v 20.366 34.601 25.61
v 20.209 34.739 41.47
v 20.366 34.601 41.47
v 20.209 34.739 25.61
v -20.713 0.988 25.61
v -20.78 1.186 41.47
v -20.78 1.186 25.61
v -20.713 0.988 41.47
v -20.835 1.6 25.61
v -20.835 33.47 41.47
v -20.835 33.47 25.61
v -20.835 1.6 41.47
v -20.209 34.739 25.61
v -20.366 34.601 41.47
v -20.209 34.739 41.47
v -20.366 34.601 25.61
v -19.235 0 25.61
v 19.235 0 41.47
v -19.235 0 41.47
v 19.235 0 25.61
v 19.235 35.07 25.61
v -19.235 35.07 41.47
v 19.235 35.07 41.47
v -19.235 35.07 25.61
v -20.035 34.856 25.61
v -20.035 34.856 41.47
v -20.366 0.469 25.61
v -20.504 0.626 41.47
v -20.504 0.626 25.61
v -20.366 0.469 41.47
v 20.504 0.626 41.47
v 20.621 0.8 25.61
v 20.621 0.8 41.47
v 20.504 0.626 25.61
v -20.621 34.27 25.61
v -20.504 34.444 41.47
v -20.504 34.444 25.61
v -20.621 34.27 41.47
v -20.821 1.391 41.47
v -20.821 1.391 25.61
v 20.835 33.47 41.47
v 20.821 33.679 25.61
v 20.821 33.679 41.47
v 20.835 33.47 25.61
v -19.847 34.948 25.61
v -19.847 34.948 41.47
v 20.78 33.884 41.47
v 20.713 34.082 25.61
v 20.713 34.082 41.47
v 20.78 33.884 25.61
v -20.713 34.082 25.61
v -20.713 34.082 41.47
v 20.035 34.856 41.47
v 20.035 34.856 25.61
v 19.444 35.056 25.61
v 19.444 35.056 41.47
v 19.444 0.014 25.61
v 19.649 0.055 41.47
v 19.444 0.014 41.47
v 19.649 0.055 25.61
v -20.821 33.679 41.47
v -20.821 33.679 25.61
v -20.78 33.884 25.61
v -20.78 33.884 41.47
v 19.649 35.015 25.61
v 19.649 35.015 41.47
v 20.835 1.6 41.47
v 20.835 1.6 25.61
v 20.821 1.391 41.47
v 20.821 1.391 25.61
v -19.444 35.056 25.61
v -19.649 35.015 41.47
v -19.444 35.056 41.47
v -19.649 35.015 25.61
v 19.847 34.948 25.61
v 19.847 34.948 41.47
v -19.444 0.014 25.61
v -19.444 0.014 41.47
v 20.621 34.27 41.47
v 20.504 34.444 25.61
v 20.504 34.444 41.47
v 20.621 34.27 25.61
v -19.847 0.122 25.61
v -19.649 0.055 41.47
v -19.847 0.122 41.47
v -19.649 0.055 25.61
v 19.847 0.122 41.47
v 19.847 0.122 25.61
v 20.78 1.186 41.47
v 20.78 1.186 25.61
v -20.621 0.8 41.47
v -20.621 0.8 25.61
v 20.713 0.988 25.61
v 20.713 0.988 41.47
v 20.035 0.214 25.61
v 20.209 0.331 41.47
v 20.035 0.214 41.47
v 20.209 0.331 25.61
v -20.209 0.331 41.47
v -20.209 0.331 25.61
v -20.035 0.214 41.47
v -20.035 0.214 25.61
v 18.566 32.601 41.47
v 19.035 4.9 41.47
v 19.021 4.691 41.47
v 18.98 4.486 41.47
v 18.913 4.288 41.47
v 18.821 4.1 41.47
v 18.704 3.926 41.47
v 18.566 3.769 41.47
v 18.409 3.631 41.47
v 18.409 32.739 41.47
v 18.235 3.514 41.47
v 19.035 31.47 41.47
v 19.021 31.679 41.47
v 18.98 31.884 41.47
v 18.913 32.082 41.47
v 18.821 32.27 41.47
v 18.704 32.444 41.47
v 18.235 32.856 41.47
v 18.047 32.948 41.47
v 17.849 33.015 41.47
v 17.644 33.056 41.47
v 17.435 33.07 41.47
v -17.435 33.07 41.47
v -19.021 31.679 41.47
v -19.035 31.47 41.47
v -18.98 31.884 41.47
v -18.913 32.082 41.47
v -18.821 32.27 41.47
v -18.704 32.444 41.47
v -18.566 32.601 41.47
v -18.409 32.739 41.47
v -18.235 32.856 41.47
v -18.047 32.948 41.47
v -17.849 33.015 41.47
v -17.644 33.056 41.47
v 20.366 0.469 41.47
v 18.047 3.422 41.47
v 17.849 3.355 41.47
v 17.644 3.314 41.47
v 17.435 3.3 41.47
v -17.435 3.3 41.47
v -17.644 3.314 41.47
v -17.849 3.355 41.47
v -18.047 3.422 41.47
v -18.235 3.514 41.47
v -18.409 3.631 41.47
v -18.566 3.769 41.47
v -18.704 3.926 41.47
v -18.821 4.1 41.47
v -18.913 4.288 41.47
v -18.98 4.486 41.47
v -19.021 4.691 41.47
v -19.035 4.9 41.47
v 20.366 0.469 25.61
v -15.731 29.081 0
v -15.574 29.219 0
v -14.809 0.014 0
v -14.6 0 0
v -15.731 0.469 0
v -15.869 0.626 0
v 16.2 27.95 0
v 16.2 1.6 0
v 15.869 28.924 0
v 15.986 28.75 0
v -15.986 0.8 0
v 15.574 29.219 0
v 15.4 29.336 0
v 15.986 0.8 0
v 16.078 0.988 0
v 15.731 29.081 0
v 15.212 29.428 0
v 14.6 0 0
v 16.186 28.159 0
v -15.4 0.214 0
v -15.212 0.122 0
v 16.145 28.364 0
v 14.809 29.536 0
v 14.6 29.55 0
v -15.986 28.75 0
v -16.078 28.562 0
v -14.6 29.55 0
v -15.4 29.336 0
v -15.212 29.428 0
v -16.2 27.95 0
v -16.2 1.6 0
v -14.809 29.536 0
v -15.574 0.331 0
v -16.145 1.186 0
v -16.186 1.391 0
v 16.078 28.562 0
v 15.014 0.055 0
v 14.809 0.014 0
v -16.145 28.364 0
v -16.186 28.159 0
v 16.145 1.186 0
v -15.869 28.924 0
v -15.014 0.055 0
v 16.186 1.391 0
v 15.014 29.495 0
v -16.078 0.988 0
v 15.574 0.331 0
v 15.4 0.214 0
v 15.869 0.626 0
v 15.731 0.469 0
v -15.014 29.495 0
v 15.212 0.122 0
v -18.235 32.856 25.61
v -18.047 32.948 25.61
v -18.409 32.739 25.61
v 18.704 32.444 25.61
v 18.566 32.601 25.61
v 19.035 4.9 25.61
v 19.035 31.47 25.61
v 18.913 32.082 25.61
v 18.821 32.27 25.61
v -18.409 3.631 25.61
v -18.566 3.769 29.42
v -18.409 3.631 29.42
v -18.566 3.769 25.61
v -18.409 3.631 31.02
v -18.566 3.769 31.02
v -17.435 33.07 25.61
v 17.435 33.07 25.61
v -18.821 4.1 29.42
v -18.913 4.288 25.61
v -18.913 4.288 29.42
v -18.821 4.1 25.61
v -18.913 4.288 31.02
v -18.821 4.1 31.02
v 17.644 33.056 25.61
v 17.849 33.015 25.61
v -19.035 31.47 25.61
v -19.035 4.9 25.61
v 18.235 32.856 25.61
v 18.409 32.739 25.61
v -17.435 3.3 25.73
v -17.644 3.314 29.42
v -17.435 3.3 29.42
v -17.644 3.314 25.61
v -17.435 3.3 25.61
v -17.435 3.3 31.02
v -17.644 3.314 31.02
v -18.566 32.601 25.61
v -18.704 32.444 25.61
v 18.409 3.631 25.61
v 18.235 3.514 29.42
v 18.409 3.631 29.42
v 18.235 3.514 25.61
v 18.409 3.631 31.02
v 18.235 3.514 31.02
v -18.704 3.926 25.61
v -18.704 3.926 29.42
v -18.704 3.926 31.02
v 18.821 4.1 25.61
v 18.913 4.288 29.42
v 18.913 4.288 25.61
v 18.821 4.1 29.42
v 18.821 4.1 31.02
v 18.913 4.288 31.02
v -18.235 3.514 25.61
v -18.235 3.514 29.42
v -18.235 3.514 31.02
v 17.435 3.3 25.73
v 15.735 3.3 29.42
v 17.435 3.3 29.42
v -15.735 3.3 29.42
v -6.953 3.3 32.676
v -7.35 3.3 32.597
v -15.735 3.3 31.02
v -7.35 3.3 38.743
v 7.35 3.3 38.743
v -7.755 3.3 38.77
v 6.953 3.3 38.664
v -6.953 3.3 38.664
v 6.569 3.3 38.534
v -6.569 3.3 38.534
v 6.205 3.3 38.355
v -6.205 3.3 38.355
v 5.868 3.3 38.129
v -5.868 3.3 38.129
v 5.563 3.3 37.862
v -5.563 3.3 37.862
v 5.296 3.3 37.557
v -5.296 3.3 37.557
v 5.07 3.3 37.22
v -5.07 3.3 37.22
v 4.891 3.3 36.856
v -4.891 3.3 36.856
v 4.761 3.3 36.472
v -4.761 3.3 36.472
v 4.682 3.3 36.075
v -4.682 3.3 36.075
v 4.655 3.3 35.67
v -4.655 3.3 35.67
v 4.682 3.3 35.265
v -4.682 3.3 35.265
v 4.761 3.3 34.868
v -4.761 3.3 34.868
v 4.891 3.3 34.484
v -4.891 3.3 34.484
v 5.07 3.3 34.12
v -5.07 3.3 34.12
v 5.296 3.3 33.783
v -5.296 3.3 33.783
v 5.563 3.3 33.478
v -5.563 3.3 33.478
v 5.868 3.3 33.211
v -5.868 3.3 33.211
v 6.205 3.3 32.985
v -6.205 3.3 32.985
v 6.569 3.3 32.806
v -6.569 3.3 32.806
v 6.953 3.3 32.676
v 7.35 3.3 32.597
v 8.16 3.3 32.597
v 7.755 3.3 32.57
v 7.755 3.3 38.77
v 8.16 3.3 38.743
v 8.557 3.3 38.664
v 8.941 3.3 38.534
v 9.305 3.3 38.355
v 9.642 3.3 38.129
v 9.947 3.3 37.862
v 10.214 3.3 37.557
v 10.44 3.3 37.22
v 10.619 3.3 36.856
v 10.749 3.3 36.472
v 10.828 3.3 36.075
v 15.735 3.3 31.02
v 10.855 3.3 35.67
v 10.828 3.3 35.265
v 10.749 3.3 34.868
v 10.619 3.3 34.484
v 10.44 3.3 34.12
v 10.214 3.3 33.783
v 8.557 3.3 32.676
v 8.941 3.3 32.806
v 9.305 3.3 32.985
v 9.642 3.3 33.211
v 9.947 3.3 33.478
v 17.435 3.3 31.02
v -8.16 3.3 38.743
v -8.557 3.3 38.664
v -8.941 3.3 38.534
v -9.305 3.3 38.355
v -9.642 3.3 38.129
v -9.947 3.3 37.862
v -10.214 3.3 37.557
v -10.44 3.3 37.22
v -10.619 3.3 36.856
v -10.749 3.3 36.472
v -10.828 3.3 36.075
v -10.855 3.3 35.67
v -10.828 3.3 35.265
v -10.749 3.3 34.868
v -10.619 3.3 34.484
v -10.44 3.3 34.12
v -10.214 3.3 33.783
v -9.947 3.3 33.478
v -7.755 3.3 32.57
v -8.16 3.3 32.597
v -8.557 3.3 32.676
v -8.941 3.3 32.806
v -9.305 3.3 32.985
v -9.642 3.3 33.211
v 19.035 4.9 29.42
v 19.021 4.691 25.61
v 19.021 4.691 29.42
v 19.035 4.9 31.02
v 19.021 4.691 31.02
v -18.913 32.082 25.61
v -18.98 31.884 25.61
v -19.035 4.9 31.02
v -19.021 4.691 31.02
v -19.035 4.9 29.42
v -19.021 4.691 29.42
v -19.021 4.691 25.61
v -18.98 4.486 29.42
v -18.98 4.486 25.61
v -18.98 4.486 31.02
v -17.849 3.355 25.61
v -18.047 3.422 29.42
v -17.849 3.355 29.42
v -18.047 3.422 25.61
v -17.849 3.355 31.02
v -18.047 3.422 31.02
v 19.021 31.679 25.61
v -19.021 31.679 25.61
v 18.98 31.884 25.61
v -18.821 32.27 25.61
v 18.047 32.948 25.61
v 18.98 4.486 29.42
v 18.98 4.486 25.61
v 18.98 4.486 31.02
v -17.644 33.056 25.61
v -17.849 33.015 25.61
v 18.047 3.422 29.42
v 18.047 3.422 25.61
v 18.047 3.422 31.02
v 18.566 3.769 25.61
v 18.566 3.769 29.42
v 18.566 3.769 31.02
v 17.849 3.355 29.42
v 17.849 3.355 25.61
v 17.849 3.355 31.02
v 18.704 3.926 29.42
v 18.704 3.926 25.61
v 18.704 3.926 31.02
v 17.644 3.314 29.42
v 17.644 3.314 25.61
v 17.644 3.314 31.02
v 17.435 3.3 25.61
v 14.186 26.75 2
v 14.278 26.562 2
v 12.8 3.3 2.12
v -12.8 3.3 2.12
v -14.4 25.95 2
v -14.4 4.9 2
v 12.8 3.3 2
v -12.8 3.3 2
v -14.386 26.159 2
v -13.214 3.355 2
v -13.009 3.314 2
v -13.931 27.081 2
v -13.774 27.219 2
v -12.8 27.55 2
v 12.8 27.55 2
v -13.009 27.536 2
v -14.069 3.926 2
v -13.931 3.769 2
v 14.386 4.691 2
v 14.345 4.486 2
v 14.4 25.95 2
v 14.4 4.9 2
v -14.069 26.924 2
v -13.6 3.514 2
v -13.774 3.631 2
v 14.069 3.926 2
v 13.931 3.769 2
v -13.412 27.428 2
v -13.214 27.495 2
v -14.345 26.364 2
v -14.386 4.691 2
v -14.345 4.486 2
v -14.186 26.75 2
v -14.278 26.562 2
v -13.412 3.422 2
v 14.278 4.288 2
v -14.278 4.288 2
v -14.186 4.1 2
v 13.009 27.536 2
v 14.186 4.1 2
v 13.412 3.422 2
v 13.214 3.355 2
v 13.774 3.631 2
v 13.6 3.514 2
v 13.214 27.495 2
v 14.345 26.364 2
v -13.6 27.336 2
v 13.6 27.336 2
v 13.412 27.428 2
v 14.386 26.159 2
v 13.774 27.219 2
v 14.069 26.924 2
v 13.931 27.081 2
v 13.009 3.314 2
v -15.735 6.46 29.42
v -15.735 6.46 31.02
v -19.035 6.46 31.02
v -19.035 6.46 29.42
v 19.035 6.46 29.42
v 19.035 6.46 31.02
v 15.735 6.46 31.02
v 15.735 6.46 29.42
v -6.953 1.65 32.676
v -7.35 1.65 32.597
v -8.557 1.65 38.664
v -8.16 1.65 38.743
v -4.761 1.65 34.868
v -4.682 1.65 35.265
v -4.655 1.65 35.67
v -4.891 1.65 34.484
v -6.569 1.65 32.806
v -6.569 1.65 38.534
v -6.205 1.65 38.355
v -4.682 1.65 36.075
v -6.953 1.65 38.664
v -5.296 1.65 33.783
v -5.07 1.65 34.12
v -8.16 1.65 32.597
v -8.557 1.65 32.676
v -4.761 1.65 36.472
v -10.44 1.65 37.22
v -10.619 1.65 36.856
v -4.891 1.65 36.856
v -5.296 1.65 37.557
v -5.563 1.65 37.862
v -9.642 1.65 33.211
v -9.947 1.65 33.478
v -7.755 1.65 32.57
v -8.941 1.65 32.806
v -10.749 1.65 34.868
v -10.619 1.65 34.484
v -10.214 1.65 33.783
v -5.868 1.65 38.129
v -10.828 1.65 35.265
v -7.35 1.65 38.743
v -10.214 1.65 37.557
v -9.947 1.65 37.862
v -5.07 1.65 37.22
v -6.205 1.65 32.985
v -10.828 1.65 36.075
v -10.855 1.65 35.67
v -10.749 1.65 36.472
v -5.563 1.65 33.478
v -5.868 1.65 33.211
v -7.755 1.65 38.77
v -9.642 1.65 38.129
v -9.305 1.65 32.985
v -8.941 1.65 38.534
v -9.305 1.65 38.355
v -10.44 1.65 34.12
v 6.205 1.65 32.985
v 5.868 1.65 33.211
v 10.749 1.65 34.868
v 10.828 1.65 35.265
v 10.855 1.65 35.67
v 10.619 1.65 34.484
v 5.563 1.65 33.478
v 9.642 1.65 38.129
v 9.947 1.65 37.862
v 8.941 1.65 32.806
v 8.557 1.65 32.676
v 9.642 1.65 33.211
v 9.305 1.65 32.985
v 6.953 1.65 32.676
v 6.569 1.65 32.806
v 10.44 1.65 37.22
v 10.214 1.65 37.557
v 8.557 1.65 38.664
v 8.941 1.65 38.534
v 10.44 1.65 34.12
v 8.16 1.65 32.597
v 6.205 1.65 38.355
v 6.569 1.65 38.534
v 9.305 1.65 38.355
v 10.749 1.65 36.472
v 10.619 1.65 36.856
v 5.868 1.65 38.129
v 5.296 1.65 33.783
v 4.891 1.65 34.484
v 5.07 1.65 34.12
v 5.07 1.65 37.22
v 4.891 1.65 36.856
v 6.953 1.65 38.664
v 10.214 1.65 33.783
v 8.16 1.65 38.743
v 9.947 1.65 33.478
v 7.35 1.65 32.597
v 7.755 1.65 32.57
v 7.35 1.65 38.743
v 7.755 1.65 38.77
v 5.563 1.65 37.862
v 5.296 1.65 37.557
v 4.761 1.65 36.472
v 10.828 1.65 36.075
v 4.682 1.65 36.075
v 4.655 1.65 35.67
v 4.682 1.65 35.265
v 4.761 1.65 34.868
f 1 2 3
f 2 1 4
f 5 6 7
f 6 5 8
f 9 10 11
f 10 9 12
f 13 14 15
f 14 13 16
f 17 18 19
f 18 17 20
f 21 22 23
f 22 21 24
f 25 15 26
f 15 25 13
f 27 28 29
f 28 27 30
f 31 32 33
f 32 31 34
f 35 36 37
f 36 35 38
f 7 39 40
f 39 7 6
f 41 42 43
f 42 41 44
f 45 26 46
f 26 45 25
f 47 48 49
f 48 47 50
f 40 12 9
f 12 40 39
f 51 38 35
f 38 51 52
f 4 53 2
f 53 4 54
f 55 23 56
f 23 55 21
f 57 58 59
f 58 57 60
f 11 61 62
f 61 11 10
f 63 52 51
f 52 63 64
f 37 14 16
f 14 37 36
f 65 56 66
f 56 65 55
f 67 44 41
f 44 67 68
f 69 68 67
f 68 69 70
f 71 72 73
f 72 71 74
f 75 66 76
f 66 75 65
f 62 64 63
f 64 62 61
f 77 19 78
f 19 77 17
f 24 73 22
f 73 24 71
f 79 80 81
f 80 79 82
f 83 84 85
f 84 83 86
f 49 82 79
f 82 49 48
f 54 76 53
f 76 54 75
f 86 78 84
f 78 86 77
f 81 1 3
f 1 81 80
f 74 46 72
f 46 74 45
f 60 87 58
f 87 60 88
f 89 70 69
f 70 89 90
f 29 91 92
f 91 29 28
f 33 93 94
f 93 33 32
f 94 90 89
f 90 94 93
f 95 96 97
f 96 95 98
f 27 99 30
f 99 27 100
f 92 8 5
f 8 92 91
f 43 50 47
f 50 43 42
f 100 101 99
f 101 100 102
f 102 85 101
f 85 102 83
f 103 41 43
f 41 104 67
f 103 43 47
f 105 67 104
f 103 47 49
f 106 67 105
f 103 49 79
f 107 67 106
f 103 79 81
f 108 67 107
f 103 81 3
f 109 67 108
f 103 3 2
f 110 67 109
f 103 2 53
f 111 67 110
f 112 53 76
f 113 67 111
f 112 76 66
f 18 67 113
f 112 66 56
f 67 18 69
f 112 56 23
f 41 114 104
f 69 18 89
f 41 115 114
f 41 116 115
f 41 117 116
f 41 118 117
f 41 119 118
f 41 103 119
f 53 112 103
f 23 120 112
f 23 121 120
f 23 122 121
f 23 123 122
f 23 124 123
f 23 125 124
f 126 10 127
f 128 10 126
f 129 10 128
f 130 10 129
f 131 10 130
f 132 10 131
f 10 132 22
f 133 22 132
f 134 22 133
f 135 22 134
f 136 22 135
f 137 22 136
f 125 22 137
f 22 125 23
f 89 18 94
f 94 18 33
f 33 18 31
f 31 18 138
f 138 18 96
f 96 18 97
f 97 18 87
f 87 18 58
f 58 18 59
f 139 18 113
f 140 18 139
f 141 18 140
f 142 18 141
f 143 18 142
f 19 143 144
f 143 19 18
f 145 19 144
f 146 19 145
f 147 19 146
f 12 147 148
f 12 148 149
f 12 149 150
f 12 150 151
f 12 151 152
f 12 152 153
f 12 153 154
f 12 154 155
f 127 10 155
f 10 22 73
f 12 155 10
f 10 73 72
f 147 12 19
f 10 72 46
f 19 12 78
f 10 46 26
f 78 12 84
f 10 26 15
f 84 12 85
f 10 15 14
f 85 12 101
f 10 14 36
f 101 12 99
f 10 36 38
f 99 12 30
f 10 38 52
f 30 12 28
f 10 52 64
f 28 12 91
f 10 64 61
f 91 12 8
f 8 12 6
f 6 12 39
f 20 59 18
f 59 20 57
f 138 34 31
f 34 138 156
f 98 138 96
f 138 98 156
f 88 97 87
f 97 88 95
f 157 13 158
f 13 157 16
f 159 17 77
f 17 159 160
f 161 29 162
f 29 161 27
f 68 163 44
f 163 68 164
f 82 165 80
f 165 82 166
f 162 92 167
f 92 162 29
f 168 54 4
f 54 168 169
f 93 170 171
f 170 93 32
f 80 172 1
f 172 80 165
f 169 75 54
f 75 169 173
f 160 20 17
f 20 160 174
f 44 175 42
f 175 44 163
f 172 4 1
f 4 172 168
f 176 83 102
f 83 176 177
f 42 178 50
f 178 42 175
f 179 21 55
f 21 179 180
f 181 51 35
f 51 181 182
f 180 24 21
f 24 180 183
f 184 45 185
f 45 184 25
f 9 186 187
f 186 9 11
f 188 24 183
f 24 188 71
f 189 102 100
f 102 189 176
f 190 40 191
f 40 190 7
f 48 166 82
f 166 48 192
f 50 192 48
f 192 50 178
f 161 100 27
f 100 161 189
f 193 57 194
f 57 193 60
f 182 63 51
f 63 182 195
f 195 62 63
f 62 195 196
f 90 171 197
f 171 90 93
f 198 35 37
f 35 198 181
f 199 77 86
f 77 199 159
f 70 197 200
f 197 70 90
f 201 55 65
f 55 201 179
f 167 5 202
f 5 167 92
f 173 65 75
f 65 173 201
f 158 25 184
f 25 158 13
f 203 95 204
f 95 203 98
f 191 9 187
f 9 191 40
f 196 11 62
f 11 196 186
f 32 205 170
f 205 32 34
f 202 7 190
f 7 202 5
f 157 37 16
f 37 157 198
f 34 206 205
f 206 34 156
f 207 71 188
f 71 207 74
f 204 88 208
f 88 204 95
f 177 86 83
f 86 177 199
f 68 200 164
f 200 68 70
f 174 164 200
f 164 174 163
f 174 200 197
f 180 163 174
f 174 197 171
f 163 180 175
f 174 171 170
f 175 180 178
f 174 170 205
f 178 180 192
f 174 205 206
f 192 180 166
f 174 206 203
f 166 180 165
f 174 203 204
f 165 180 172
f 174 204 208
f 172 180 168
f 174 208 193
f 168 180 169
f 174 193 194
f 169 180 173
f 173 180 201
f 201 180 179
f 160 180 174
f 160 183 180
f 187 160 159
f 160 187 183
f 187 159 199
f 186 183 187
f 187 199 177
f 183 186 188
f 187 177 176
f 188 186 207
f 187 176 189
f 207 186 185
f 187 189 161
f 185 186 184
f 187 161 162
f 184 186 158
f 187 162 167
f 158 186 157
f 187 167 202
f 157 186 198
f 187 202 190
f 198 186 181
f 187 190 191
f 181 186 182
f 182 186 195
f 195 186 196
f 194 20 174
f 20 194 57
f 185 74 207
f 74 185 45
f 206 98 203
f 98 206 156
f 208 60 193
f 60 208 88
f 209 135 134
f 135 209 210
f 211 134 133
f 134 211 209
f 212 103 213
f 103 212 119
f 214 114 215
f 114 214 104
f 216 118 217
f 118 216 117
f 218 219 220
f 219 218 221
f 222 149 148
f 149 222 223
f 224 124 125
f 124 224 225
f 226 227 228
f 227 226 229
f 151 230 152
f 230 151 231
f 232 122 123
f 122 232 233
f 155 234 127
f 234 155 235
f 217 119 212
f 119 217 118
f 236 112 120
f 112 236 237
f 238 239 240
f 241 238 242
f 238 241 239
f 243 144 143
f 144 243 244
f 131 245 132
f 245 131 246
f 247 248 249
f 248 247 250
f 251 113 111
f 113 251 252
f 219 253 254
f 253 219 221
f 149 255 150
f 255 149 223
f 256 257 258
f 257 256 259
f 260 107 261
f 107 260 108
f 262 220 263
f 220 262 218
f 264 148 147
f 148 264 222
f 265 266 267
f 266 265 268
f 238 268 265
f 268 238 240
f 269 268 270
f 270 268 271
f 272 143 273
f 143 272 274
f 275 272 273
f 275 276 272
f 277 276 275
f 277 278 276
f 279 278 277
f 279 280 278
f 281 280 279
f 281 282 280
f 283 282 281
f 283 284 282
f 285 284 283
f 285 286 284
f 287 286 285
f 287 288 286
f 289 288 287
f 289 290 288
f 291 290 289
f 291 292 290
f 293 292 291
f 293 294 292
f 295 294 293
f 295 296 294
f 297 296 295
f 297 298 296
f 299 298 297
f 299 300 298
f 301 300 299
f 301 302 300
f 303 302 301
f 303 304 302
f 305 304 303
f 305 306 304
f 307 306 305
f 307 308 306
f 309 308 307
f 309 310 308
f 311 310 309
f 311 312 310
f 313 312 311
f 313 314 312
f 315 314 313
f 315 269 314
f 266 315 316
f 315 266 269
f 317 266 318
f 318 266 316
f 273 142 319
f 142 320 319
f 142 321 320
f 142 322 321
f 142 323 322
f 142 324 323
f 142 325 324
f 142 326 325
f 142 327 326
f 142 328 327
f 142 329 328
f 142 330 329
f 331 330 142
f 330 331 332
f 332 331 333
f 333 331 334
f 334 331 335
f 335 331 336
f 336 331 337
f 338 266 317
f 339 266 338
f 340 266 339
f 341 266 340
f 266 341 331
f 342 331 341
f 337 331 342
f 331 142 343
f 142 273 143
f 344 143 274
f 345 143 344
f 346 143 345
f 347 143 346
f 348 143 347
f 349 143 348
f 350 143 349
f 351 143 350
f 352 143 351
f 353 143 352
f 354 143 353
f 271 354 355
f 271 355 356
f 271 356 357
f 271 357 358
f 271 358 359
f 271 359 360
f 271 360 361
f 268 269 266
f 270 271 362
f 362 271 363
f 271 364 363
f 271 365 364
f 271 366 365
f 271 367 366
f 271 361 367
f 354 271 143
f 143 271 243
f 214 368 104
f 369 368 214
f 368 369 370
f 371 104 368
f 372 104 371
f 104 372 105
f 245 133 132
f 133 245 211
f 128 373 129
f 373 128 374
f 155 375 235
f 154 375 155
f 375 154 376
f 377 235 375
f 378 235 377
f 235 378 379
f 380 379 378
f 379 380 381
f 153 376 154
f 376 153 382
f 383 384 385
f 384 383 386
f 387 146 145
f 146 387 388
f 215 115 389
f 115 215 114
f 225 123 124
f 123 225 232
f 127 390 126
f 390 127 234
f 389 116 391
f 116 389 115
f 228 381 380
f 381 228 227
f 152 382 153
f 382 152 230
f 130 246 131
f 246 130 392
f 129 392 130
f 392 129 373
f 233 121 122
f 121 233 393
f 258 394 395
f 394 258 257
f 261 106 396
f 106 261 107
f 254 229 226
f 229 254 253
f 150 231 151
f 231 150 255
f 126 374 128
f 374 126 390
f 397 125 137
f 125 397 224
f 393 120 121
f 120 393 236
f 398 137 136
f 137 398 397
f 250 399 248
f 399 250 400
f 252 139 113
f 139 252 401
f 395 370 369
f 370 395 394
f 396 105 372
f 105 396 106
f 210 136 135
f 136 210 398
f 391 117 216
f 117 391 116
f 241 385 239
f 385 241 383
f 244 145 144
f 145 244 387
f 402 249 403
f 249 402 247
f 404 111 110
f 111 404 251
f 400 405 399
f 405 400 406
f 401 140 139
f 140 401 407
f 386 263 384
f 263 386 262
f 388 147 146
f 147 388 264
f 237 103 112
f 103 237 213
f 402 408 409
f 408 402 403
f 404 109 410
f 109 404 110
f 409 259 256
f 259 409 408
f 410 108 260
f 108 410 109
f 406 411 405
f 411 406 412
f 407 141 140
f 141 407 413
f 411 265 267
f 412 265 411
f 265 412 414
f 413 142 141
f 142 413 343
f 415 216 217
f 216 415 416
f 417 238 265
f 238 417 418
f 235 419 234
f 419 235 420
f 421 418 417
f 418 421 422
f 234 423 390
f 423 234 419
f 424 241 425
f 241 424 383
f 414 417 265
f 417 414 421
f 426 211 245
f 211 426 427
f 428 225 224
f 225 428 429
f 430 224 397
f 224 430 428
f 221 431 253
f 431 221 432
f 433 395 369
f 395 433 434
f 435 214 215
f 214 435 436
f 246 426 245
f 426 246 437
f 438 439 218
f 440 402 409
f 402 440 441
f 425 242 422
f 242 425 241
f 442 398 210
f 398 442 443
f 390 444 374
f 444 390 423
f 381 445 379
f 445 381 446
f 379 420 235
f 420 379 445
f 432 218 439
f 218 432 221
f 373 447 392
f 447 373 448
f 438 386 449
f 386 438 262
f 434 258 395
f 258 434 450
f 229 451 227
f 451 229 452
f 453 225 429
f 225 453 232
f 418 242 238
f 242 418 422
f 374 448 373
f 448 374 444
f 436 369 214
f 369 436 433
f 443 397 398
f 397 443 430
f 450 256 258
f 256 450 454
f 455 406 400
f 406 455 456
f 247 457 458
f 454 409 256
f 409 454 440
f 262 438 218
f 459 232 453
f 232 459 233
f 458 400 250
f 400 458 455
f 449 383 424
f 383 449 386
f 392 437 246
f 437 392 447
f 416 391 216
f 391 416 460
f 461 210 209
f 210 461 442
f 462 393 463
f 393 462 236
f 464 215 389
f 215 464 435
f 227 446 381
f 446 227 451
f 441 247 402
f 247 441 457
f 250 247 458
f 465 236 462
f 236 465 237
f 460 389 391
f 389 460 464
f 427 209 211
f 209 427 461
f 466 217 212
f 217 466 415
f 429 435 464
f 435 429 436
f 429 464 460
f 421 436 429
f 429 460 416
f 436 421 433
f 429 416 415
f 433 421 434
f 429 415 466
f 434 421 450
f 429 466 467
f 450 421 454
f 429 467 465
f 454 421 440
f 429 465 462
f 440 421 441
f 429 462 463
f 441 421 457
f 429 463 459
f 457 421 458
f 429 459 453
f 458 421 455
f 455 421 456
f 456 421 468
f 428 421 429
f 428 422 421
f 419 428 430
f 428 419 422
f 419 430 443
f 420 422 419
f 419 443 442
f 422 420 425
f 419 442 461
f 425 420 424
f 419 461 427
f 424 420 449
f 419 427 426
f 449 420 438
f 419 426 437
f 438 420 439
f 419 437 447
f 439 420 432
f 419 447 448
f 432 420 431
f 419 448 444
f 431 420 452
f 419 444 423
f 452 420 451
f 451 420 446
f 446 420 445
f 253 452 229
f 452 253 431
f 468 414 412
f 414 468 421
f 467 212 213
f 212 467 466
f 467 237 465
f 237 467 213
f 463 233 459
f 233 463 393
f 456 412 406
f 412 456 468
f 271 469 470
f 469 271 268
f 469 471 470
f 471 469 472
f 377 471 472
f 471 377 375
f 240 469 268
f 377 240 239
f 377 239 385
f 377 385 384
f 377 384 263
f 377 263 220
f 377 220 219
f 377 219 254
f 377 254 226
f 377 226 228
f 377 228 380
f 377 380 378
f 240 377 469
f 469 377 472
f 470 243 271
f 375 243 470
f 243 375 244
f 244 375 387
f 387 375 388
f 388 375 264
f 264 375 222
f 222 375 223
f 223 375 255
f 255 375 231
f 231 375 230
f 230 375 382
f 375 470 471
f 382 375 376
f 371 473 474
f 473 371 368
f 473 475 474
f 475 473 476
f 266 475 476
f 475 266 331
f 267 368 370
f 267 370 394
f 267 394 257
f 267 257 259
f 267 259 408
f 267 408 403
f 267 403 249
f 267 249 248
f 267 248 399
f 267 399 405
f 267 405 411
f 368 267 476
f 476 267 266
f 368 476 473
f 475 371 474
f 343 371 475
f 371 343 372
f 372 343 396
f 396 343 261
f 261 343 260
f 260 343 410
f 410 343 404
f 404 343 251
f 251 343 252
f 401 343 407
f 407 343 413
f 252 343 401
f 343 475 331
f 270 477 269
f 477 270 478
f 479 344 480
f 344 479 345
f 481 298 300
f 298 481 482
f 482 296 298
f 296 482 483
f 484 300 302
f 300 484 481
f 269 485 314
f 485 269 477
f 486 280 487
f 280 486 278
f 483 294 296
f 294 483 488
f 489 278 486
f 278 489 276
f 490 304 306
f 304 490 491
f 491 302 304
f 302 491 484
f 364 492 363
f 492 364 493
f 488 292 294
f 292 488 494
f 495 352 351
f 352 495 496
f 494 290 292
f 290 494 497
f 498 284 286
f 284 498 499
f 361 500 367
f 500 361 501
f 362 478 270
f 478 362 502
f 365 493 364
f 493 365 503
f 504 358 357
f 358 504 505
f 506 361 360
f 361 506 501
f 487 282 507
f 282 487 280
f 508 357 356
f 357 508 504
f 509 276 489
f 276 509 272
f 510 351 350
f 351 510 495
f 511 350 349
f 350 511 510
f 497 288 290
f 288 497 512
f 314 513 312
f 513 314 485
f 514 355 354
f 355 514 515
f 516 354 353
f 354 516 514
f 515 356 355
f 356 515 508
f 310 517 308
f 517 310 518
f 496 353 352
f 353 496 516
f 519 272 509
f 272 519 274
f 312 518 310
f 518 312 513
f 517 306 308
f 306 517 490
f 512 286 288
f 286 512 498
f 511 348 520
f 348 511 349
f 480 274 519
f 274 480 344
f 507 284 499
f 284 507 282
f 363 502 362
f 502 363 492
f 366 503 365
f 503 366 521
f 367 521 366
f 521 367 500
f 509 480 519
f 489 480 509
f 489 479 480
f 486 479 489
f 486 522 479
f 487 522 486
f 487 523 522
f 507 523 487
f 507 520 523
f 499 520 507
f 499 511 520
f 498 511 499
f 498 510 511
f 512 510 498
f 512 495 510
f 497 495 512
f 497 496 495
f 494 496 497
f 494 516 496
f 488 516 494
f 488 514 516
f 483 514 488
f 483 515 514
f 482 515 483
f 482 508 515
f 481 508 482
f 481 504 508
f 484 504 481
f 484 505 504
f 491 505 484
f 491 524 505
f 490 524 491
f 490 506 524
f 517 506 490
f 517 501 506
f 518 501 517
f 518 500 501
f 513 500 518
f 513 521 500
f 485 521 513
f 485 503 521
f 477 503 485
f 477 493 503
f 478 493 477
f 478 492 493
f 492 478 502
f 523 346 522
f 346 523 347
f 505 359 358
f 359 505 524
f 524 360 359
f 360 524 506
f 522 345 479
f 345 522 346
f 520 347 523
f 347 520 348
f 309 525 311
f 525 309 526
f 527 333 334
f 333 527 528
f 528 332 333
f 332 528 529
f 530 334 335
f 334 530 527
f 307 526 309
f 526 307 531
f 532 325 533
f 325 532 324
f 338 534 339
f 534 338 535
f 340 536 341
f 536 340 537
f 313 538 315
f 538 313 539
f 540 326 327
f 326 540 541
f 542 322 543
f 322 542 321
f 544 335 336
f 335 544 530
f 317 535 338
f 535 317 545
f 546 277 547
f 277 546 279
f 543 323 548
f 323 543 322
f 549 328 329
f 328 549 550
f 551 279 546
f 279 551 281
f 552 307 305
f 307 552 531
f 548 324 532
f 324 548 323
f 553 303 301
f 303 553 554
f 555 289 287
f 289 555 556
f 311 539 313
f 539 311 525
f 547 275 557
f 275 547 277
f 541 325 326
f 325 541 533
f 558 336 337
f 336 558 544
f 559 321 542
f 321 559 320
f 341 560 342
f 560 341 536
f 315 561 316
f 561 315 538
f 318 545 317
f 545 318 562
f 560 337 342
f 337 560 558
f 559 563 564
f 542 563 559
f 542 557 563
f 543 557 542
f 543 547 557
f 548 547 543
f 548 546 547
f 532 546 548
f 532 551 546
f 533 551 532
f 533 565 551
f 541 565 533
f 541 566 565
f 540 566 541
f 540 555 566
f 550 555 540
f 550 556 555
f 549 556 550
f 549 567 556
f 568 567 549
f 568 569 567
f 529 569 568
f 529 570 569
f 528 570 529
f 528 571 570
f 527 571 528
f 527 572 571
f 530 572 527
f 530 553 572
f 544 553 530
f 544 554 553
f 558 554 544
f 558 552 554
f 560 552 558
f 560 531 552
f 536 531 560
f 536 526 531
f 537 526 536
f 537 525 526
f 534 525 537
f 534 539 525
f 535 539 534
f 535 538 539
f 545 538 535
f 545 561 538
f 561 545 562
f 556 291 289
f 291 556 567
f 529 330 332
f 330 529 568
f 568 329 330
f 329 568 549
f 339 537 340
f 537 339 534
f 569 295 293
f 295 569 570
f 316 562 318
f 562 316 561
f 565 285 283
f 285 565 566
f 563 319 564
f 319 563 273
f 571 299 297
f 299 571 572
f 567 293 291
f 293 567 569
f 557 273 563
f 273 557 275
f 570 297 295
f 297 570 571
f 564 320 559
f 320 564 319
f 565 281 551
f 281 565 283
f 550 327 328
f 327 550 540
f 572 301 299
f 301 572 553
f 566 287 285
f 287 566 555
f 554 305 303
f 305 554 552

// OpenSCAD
/*
 * N0SA RLP V3 magnetic paddle nose guard — fit-test prototype
 *
 * Single-piece, tapered, closed-nose PETG shell protecting the finger pieces.
 * The whole shell (top, sides, and continuous magnetic underside) ends at
 * the SAME rear plane, just past the front pair of the RLP's four base
 * magnets. No underside projection, notch, or U-shaped cutout.
 *
 * Coordinates: +Y points toward the paddle tips. The front edge of the rigid
 * body is at Y=0; the underside of its bottom plate is at Z=0.
 *
 * Owner print fit report October 30: overall envelope and magnet alignment
 * looked good; the front nose was too short. Paddle tip projection is now
 * measured from the same fixed-body front edge as the key shell: 27.11 mm.
 * The far edge of the front magnets was measured 8.24 mm behind that edge.
 * Existing pocket centers are intentionally UNCHANGED because they aligned
 * in the first printed trial. Check all clearances before gluing magnets.
 *
 * PRINT ORIENTATION: by default, guard exports nose-down with the closed
 * face against the build plate and the open rear end facing upward.
 * This avoids a ~38 mm unsupported PETG roof bridge. A small ~6 mm
 * magnet-pocket overhang and stop pads remain: check slicer preview.
 * Coupons/gauges always export flat with their bottom against the bed.
 */

// PART SELECTION
part = "guard";                    // [guard,fit_coupon,magnet_gauge,floor_coupon,depth_gauge,fit_test_plate]
print_orientation = "nose_down";   // [nose_down,as_used] (guard only)

// DIMENSIONS FROM OWNER'S CALIPER PHOTOS (mm)
key_width = 36.77;
key_height = 28.92;
paddle_projection = 27.11;          // owner-measured from body front edge to paddle tips

// OWNER'S OCT 30 CALIPER MEASUREMENTS: the pair nearest the paddles.
// Span = from outside edge of one magnet to outside edge of the other.
// The edge margin is from the key's *front plastic edge* to the nearer
// circumferential edge of each magnet. Confirm this coordinate datum on
// the physical key before gluing the magnets.
key_magnet_diameter = 6.0;
key_magnet_outer_span = 21.51;
key_magnet_front_margin = 1.5;
// Derived front-pair magnet centers, relative to fixed-body front edge Y=0
magnet_spacing = key_magnet_outer_span - key_magnet_diameter; // 15.51 mm
magnet_y = -(key_magnet_front_margin + key_magnet_diameter/2); // -4.50 mm

// CLEARANCES AND WALLS (adjust after test fit)
body_side_clearance = 0.65;          // each side at the key-body overlap
body_top_clearance = 0.60;
underbody_gap = 0.25;               // continuous floor to key underside
floor_thickness = 3.30;
side_wall = 1.80;
roof_wall = 2.00;
nose_wall = 2.00;
tip_clearance = 2.00;               // paddle ends to inside nose wall

// GEOMETRY — uniform rear extent for roof, sides, and magnetic underside.
// Owner's October 30 measurement: 8.24 mm from fixed-body front edge to
// FAR edge of the existing front magnet. Add a 2 mm rearward shell margin.
// Intentionally do NOT infer new pocket centers from this: the actual V5
// magnet pockets were reported to line up. Previous near-edge measurement
// was approximate and differs from this far-edge measurement by 0.74 mm.
measured_magnet_far_edge = 8.24;
magnet_rear_margin = 2.00;
back_overlap = measured_magnet_far_edge + magnet_rear_margin;  // 10.24 mm
taper_start = 5.5;                  // full-size enclosure over lever roots
tip_outer_width = 32.4;            // outer cross-section at front bumper
tip_outer_top = 26.0;              // relative to underside of key
nose_extra = tip_clearance + nose_wall;  // 27.11 + 2 + 2 = 31.11 mm from front
corner_radius = 1.6;               // rounded cross-sections, mm

// ADD-ON MAGNETS: owner has N48 6 x 1.5 mm and 6 x 2.0 mm discs.
// Default is 6 x 1.5 mm. Use -D 'insert_thickness=2.0' for 6 x 2 mm.
// Pocket depth is magnet thickness + 0.15 mm for glue/print tolerance.
insert_diameter = 6.0;
insert_thickness = 1.5;
pocket_diameter_extra = 0.20;       // 6.20 mm opening for 6 mm discs
pocket_depth_extra = 0.15;         // 1.65 mm or 2.15 mm pocket
// At floor_thickness=3.30, remaining floor = 1.65 mm / 1.15 mm.
// Both inserts have the same face recess when fully seated.

// OPEN FLOOR FIT TEST (November 1): the owner reported good magnet diameter,
// alignment and stop contact, but slightly proud magnets and ~2.5 mm excess
// shell height. Test deeper pockets and exposed tip clearance before changing
// the full guard. These controls affect floor_coupon ONLY.
floor_coupon_depth_increase = 0.25; // 2.40 mm pocket with 2 mm inserts
floor_coupon_marks = true;         // solid: inside nose; dashed: measured tips
floor_coupon_mark_depth = 0.30;
floor_coupon_mark_width = 0.60;

// DEPTH LADDER: all holes keep the proven diameter; only their depth changes.
// Print at 0.10 mm layers to resolve the 0.10 mm steps. This gauge and the
// combined fit_test_plate do not change the guard's default pocket depth.
depth_gauge_depths = [2.15,2.25,2.35,2.45];
depth_gauge_pitch = 13.0;
depth_gauge_length = 16.0;
depth_gauge_label_height = 0.50;

// STOPS: shoulders on the outer edges of the stationary lower plate.
// Carry impact into the rigid body, not the moving paddles.
enable_stop_pads = true;
stop_pad_width = 3.3;
stop_pad_height = 3.2;
stop_pad_depth = 1.6;
stop_pad_back_y = 0.15; // 0.15 mm seating travel from the nominal body datum

// SIDE GUIDES are shallow and deliberately loose; no clip-on force
side_guide_height = 2.2;
side_guide_length = 10.0;

$fn = 48;
eps = 0.03;
slice_depth = 0.12; // thickness of loft boundary slices

// Derived coordinates
inner_root_width = key_width + 2 * body_side_clearance;
outer_root_width = inner_root_width + 2 * side_wall;
inner_root_top = key_height + body_top_clearance;
outer_root_top = inner_root_top + roof_wall;
floor_bottom = -underbody_gap - floor_thickness;
floor_top = -underbody_gap;
outer_tip_top = tip_outer_top;
inner_tip_top = tip_outer_top - roof_wall;
inner_tip_width = tip_outer_width - 2 * side_wall;
outer_tip_y = paddle_projection + nose_extra;
inner_tip_y = outer_tip_y - nose_wall;
back_y = -back_overlap;
shroud_y = back_y;                  // entire shell shares the same rear plane

pocket_d = insert_diameter + pocket_diameter_extra;
pocket_depth = insert_thickness + pocket_depth_extra;

assert(back_y < magnet_y - pocket_d/2 - 1,
    "Back overlap too short for magnet pockets");
assert(outer_tip_y - nose_wall - paddle_projection >= tip_clearance - 0.01,
    "Nose does not clear measured paddle projection");
assert(magnet_y + pocket_d/2 < 0,
    "Front magnet pocket extends past the fixed body front edge");
assert(insert_thickness > 0 && pocket_depth_extra >= 0,
    "Magnet thickness and clearance must be nonnegative");
assert(pocket_depth < floor_thickness - 0.8,
    "Maintain at least 0.8 mm floor below magnet pockets");
assert(inner_tip_width > 0 && inner_tip_top > 0,
    "Tip dimensions must be positive");

module round_rect(w,h,r) {
    // r small enough not to change nominal envelope
    offset(r = r)
        square([w - 2*r, h - 2*r], center = true);
}

module xz_slice(w,z0,z1,y,r=corner_radius) {
    translate([0,y,(z0+z1)/2])
        rotate([90,0,0])
            linear_extrude(height = slice_depth, center = true)
                round_rect(w,z1-z0,min(r,(z1-z0)/3,w/3));
}

module loft_between(w1,z0_1,z1_1,y1,w2,z0_2,z1_2,y2,r=corner_radius) {
    hull() {
        xz_slice(w1,z0_1,z1_1,y1,r);
        xz_slice(w2,z0_2,z1_2,y2,r);
    }
}

module shroud_outer() {
    union() {
        loft_between(outer_root_width, floor_bottom, outer_root_top, shroud_y,
                     outer_root_width, floor_bottom, outer_root_top, taper_start);
        loft_between(outer_root_width, floor_bottom, outer_root_top, taper_start,
                     tip_outer_width, floor_bottom, outer_tip_top, outer_tip_y);
    }
}

module shroud_inner() {
    // Exit the back fully so guard can slide on; stop short of front to close nose.
    // Tapered lever clearance must be verified on the real key at full travel.
    union() {
        loft_between(inner_root_width, floor_top, inner_root_top, shroud_y-1,
                     inner_root_width, floor_top, inner_root_top, taper_start);
        loft_between(inner_root_width, floor_top, inner_root_top, taper_start,
                     inner_tip_width, floor_top, inner_tip_top, inner_tip_y);
    }
}

module coupon_floor(front_y = 0) {
    // Flat, straight-edged underside plate for the fit-test coupon ONLY.
    // The full guard already has a continuous floor across its whole length.
    // Coupon extends to Y=0 so magnet pockets remain fully enclosed.
    translate([-outer_root_width/2, back_y, floor_bottom])
        cube([outer_root_width, front_y-back_y, floor_thickness]);
}

module coupon_side_guides(front_limit = 0) {
    // Coupon-only side guides check the fit against the fixed bottom plate.
    // The full guard has continuous, full-height side walls instead.
    guide_start_y = back_y + 2.0;
    guide_length = min(side_guide_length, front_limit-guide_start_y);
    assert(guide_length > 0, "Side guide length too small");
    for (side = [-1,1]) {
        translate([side*(inner_root_width/2 + side_wall/2),
                   guide_start_y + guide_length/2,
                   floor_top + side_guide_height/2-0.08])
            cube([side_wall,guide_length,side_guide_height],center=true);
    }
}

module fixed_body_stop_pads() {
    // Small end stops at the extreme outer corners of the *fixed* lower
    // plate; no tab crosses the central lever pathway. Check on real key!
    if (enable_stop_pads)
        for (side = [-1,1])
            translate([side*(inner_root_width/2 - stop_pad_width/2),
                       stop_pad_back_y + stop_pad_depth/2,
                       floor_top + stop_pad_height/2 - 0.04])
                cube([stop_pad_width,stop_pad_depth,stop_pad_height],center=true);
}

module magnet_pockets(depth = pocket_depth) {
    // Blind pockets accessible from the key-facing surface of the common floor.
    // Install magnets with polarities individually matched to attract key magnets.
    for (x = [-magnet_spacing/2,magnet_spacing/2])
        translate([x,magnet_y,
                   floor_top - depth])
            cylinder(d=pocket_d,h=depth + eps);
}

module floor_coupon_references() {
    if (floor_coupon_marks) {
        assert(floor_coupon_mark_depth > 0 &&
               floor_coupon_mark_depth < floor_thickness - 0.8,
               "Floor reference engraving is too deep");
        // The cavity's last centered loft slice ends 0.06 mm beyond its
        // nominal Y coordinate. Mark the actual central inside nose plane.
        translate([-inner_tip_width/2,
                   inner_tip_y + slice_depth/2 - floor_coupon_mark_width/2,
                   floor_top - floor_coupon_mark_depth])
            cube([inner_tip_width, floor_coupon_mark_width,
                  floor_coupon_mark_depth + eps]);
        // Dashed line is a measured datum, not an assertion of seated fit.
        // Actual tip position shifts when the key seats against the stops.
        for (fraction = [-0.8,-0.4,0,0.4,0.8])
            translate([fraction*inner_tip_width/2 - 1.5,
                       paddle_projection - floor_coupon_mark_width/2,
                       floor_top - floor_coupon_mark_depth])
                cube([3.0, floor_coupon_mark_width,
                      floor_coupon_mark_depth + eps]);
    }
}

module floor_coupon() {
    trial_depth = pocket_depth + floor_coupon_depth_increase;
    assert(floor_coupon_depth_increase >= 0,
           "Floor coupon pocket increase must be nonnegative");
    assert(trial_depth < floor_thickness - 0.8,
           "Maintain at least 0.8 mm below the trial pockets");
    difference() {
        union() {
            // Exact exterior floor from the guard, clipped at its mating
            // surface. No roof, side guides or raised front bumper.
            intersection() {
                shroud_outer();
                translate([-outer_root_width, back_y-1, floor_bottom-eps])
                    cube([2*outer_root_width, outer_tip_y-back_y+2,
                          floor_thickness+eps]);
            }
            fixed_body_stop_pads();
        }
        magnet_pockets(depth=trial_depth);
        floor_coupon_references();
    }
}

module full_guard() {
    difference() {
        union() {
            difference() {
                shroud_outer();
                shroud_inner();
            }
            // No projecting underside tongue: shroud floor, walls and roof
            // all terminate at back_y. Keep only impact stops here.
            fixed_body_stop_pads();
        }
        magnet_pockets();
    }
}

module fit_coupon() {
    // Same full-width floor overlap and magnet seats,
    // and same shallow side guides, but omits all paddle-enclosing material.
    difference() {
        union() {
            coupon_floor(front_y=0);
            coupon_side_guides(front_limit=0);
        }
        magnet_pockets();
    }
}

module magnet_gauge() {
    // Optional pocket-size gauge: same thickness, 2 holes with slightly
    // different tolerances for testing the exact magnets before using glue.
    gauge_x=28;
    gauge_y=14;
    difference() {
        translate([-gauge_x/2,-gauge_y/2,floor_bottom])
            cube([gauge_x,gauge_y,floor_thickness]);
        for (x=[-7,7]) { // left: tighter; right (notched edge): looser
            translate([x,0,floor_top - pocket_depth])
                cylinder(d=insert_diameter + pocket_diameter_extra +
                           (x>0 ? 0.20 : -0.10),
                         h=pocket_depth + eps);
        }
        // Small semicircular edge notch identifies the looser (+X) pocket.
        translate([gauge_x/2,0,floor_bottom-eps])
            cylinder(r=1.2,h=floor_thickness+2*eps);
    }
}

module magnet_depth_gauge() {
    count = len(depth_gauge_depths);
    gauge_width = count * depth_gauge_pitch;
    assert(count > 0 && depth_gauge_pitch > pocket_d + 4,
           "Depth gauge pockets need adequate spacing");
    assert(depth_gauge_length >= pocket_d + 8,
           "Depth gauge needs room for the labels");
    for (depth = depth_gauge_depths)
        assert(depth > 0 && depth < floor_thickness - 0.8,
               "Maintain at least 0.8 mm floor below all trial pockets");
    union() {
        difference() {
            translate([0,0,floor_bottom])
                linear_extrude(height=floor_thickness)
                    round_rect(gauge_width,depth_gauge_length,1.0);
            for (index = [0:count-1])
                translate([(index-(count-1)/2)*depth_gauge_pitch,-2,
                           floor_top-depth_gauge_depths[index]])
                    cylinder(d=pocket_d,h=depth_gauge_depths[index]+eps);
            // Notch identifies the shallow end without relying on the labels.
            translate([-gauge_width/2,0,floor_bottom-eps])
                cylinder(r=1,h=floor_thickness+2*eps);
        }
        for (index = [0:count-1])
            translate([(index-(count-1)/2)*depth_gauge_pitch,3,floor_top-eps])
                linear_extrude(height=depth_gauge_label_height+eps)
                    text(str(depth_gauge_depths[index]),size=2.8,
                         font="Liberation Sans:style=Bold",halign="center");
    }
}

module fit_test_plate() {
    // Two separate, flat parts in one STL. A 6 mm gap leaves room for slicing
    // them as individual objects, without breakaway tabs or extra fit surfaces.
    translate([0,0,-floor_bottom]) floor_coupon();
    translate([outer_root_width/2 + 6 +
               len(depth_gauge_depths)*depth_gauge_pitch/2,
               back_y-slice_depth/2+depth_gauge_length/2,
               -floor_bottom])
        magnet_depth_gauge();
}

module printable_guard() {
    if (print_orientation == "nose_down") {
        // Rotation about X: new Z = -old Y. Place maximum old Y at Z=0,
        // so the flat closed nose becomes the entire first layer. The big
        // roof now forms one of the vertical walls instead of a long bridge.
        // Translate old Z into nonnegative bed Y for easier slicing.
        translate([0, -floor_bottom, outer_tip_y + slice_depth/2])
            rotate([-90, 0, 0])
                full_guard();
    } else if (print_orientation == "as_used") {
        // Useful for dimensional inspection / visualizing attachment.
        // This orientation needs a ~38 mm roof bridge or supports to print.
        full_guard();
    } else {
        assert(false, "Unknown print_orientation");
    }
}

if (part=="guard") printable_guard();
else if (part=="fit_coupon") translate([0,0,-floor_bottom]) fit_coupon();
else if (part=="magnet_gauge") translate([0,0,-floor_bottom]) magnet_gauge();
else if (part=="floor_coupon") translate([0,0,-floor_bottom]) floor_coupon();
else if (part=="depth_gauge") translate([0,0,-floor_bottom]) magnet_depth_gauge();
else if (part=="fit_test_plate") fit_test_plate();
else assert(false,"Unknown part");
